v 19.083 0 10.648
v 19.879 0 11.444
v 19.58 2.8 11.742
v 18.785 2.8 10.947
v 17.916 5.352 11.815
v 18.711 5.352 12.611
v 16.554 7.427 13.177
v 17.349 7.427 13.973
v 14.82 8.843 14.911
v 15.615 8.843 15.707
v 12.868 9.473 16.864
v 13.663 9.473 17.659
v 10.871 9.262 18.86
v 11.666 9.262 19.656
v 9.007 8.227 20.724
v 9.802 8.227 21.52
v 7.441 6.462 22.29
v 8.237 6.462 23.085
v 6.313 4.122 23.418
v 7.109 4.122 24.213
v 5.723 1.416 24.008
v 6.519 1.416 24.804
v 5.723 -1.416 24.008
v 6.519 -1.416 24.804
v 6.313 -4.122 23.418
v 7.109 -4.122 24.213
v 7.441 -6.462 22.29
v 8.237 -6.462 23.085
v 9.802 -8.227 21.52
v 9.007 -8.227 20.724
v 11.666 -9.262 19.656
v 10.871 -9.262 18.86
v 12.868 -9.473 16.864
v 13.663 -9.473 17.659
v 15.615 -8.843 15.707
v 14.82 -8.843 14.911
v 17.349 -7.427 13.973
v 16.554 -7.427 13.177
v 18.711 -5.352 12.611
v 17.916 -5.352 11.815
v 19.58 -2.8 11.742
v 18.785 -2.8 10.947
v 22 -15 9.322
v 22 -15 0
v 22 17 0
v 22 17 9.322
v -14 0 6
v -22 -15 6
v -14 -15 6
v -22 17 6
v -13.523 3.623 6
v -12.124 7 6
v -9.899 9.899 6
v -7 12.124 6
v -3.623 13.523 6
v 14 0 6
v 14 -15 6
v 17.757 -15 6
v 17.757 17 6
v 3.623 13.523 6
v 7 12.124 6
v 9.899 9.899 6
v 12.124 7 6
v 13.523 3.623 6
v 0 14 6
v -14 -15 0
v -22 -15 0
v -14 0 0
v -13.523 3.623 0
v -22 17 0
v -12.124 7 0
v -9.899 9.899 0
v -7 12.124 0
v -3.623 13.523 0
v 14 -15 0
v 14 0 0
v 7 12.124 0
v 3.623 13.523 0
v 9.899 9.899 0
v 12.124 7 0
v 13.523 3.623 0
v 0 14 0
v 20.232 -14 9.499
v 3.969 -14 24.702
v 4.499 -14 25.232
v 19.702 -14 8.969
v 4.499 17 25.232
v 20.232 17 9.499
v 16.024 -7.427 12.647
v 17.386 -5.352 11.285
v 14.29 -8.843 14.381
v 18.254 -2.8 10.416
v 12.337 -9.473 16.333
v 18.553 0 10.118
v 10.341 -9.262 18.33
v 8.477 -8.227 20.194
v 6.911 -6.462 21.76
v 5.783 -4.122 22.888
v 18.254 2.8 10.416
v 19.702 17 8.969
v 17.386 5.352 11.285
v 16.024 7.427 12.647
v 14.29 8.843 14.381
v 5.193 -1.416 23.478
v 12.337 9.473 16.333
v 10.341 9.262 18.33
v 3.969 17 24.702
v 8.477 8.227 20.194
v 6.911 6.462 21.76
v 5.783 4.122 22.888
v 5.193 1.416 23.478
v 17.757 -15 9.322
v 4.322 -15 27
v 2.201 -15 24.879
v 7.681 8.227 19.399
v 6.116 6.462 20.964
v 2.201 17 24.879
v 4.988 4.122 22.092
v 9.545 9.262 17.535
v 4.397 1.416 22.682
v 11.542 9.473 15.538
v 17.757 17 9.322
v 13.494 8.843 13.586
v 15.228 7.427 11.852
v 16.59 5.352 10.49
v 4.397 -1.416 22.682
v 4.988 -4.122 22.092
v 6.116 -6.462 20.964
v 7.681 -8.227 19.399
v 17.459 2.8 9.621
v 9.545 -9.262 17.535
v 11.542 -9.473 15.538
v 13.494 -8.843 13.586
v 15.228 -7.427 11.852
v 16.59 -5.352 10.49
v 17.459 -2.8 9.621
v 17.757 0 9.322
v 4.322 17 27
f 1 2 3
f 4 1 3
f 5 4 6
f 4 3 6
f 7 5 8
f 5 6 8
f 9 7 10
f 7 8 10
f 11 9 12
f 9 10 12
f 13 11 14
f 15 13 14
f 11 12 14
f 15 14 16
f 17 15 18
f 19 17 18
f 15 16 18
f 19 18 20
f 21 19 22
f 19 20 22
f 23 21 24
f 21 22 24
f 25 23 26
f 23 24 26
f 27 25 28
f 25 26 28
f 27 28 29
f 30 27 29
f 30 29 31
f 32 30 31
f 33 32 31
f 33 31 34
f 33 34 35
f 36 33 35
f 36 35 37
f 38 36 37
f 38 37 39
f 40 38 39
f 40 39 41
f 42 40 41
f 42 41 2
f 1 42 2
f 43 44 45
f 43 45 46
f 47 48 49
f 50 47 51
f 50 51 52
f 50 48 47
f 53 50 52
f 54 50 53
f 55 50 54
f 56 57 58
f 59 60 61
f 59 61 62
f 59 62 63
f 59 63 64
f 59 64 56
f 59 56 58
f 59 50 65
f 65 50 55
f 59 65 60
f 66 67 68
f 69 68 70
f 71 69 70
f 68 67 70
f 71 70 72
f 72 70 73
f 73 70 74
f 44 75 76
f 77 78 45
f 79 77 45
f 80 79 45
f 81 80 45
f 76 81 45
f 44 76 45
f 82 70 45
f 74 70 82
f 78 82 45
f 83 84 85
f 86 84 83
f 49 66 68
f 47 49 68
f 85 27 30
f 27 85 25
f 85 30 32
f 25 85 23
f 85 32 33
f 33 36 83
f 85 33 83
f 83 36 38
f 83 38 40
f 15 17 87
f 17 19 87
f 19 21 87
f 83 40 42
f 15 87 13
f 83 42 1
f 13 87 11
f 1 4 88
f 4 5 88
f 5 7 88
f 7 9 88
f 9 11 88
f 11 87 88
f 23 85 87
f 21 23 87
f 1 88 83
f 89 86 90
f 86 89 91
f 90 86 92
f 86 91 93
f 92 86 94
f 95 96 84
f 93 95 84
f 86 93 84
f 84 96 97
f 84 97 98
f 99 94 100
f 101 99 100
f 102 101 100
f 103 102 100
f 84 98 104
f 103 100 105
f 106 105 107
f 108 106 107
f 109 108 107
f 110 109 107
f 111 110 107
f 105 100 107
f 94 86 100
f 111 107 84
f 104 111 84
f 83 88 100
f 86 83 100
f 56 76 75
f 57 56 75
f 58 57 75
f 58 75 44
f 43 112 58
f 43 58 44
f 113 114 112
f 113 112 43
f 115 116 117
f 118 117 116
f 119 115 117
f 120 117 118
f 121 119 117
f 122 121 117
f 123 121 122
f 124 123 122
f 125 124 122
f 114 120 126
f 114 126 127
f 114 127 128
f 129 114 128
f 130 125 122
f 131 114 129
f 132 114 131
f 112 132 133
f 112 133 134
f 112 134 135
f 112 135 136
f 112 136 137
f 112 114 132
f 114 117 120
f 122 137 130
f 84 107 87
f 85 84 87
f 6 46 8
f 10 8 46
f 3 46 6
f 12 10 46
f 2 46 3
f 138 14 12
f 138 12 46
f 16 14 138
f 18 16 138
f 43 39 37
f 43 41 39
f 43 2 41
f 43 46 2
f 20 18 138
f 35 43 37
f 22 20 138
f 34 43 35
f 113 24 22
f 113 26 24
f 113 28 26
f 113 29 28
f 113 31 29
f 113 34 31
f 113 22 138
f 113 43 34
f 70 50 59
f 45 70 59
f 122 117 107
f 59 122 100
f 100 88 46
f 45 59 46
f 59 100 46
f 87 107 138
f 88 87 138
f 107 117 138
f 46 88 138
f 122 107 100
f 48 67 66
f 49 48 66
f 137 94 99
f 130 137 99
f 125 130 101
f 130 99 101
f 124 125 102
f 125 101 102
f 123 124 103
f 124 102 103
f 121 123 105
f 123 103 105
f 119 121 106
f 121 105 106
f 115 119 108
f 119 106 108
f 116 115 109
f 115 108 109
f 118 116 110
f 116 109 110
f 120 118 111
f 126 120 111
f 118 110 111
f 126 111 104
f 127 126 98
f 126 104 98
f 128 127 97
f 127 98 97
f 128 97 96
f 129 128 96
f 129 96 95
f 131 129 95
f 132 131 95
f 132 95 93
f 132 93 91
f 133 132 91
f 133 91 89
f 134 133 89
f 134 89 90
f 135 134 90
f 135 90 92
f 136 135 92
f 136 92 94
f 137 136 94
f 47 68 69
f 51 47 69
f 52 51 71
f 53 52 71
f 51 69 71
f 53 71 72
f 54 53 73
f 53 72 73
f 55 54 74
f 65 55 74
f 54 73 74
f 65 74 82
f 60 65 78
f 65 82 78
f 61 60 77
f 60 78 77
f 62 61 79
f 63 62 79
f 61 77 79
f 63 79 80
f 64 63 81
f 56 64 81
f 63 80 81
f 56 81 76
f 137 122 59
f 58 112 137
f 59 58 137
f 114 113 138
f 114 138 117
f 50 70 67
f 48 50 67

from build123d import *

# Parameters (mm, degrees)
SALIENTE_EXTRUIR1_DEPTH = 6
SALIENTE_EXTRUIR2_DEPTH = 32
CORTAR_EXTRUIR1_REACH   = 39.705
CROQUIS3_R              = 9.5
CORTAR_EXTRUIR2_DEPTH   = 31


with BuildPart() as part:
    # Croquis1 → Saliente-Extruir1 (new body)
    with BuildSketch(Plane.XY):
        with BuildLine():
            Line((-22, 17), (-22, -15))
            Line((-22, -15), (-14, -15))
            Line((-14, -15), (-14, 0))
            ThreePointArc((-14, 0), (0, 14), (14, 0))
            Line((14, 0), (14, -15))
            Line((14, -15), (22, -15))
            Line((22, -15), (22, 17))
            Line((22, 17), (-22, 17))
        make_face()
    extrude(amount=SALIENTE_EXTRUIR1_DEPTH)

    # Croquis2 → Saliente-Extruir2 (add)
    with BuildSketch(Plane.XZ.offset(15)):
        Polygon((22, 6), (22, 9.32233047), (4.32233047, 27), (2.201010127, 24.878679656), (17.757359313, 9.32233047), (17.757359313, 6), align=None)
    extrude(amount=-SALIENTE_EXTRUIR2_DEPTH)

    # Croquis3 → Cortar-Extruir1 (cut, up to next)
    with BuildSketch(Plane(origin=(15.661165235, 0, 15.661165235), x_dir=(0.707106781, 0, -0.707106781), z_dir=(0.707106781, 0, 0.707106781)), mode=Mode.PRIVATE) as cortar_extruir1_sk1:
        with Locations((-3.535533906, 0)):
            Circle(CROQUIS3_R)
    cortar_extruir1_tool1 = extrude(cortar_extruir1_sk1.sketch, amount=-CORTAR_EXTRUIR1_REACH, mode=Mode.PRIVATE) & part.part
    add(cortar_extruir1_tool1.solids().sort_by_distance((13.161165, 0, 18.161165))[0], mode=Mode.SUBTRACT)

    # Croquis5 → Cortar-Extruir2 (cut)
    with BuildSketch(Plane(origin=(0, 17, 0), x_dir=(1, 0, 0), z_dir=(0, 1, 0))):
        Polygon((4.499107166, -25.232233047), (20.232233047, -9.499107166), (19.701902961, -8.96877708), (3.96877708, -24.701902961), align=None)
    extrude(amount=-CORTAR_EXTRUIR2_DEPTH, mode=Mode.SUBTRACT)


solid = part.part
